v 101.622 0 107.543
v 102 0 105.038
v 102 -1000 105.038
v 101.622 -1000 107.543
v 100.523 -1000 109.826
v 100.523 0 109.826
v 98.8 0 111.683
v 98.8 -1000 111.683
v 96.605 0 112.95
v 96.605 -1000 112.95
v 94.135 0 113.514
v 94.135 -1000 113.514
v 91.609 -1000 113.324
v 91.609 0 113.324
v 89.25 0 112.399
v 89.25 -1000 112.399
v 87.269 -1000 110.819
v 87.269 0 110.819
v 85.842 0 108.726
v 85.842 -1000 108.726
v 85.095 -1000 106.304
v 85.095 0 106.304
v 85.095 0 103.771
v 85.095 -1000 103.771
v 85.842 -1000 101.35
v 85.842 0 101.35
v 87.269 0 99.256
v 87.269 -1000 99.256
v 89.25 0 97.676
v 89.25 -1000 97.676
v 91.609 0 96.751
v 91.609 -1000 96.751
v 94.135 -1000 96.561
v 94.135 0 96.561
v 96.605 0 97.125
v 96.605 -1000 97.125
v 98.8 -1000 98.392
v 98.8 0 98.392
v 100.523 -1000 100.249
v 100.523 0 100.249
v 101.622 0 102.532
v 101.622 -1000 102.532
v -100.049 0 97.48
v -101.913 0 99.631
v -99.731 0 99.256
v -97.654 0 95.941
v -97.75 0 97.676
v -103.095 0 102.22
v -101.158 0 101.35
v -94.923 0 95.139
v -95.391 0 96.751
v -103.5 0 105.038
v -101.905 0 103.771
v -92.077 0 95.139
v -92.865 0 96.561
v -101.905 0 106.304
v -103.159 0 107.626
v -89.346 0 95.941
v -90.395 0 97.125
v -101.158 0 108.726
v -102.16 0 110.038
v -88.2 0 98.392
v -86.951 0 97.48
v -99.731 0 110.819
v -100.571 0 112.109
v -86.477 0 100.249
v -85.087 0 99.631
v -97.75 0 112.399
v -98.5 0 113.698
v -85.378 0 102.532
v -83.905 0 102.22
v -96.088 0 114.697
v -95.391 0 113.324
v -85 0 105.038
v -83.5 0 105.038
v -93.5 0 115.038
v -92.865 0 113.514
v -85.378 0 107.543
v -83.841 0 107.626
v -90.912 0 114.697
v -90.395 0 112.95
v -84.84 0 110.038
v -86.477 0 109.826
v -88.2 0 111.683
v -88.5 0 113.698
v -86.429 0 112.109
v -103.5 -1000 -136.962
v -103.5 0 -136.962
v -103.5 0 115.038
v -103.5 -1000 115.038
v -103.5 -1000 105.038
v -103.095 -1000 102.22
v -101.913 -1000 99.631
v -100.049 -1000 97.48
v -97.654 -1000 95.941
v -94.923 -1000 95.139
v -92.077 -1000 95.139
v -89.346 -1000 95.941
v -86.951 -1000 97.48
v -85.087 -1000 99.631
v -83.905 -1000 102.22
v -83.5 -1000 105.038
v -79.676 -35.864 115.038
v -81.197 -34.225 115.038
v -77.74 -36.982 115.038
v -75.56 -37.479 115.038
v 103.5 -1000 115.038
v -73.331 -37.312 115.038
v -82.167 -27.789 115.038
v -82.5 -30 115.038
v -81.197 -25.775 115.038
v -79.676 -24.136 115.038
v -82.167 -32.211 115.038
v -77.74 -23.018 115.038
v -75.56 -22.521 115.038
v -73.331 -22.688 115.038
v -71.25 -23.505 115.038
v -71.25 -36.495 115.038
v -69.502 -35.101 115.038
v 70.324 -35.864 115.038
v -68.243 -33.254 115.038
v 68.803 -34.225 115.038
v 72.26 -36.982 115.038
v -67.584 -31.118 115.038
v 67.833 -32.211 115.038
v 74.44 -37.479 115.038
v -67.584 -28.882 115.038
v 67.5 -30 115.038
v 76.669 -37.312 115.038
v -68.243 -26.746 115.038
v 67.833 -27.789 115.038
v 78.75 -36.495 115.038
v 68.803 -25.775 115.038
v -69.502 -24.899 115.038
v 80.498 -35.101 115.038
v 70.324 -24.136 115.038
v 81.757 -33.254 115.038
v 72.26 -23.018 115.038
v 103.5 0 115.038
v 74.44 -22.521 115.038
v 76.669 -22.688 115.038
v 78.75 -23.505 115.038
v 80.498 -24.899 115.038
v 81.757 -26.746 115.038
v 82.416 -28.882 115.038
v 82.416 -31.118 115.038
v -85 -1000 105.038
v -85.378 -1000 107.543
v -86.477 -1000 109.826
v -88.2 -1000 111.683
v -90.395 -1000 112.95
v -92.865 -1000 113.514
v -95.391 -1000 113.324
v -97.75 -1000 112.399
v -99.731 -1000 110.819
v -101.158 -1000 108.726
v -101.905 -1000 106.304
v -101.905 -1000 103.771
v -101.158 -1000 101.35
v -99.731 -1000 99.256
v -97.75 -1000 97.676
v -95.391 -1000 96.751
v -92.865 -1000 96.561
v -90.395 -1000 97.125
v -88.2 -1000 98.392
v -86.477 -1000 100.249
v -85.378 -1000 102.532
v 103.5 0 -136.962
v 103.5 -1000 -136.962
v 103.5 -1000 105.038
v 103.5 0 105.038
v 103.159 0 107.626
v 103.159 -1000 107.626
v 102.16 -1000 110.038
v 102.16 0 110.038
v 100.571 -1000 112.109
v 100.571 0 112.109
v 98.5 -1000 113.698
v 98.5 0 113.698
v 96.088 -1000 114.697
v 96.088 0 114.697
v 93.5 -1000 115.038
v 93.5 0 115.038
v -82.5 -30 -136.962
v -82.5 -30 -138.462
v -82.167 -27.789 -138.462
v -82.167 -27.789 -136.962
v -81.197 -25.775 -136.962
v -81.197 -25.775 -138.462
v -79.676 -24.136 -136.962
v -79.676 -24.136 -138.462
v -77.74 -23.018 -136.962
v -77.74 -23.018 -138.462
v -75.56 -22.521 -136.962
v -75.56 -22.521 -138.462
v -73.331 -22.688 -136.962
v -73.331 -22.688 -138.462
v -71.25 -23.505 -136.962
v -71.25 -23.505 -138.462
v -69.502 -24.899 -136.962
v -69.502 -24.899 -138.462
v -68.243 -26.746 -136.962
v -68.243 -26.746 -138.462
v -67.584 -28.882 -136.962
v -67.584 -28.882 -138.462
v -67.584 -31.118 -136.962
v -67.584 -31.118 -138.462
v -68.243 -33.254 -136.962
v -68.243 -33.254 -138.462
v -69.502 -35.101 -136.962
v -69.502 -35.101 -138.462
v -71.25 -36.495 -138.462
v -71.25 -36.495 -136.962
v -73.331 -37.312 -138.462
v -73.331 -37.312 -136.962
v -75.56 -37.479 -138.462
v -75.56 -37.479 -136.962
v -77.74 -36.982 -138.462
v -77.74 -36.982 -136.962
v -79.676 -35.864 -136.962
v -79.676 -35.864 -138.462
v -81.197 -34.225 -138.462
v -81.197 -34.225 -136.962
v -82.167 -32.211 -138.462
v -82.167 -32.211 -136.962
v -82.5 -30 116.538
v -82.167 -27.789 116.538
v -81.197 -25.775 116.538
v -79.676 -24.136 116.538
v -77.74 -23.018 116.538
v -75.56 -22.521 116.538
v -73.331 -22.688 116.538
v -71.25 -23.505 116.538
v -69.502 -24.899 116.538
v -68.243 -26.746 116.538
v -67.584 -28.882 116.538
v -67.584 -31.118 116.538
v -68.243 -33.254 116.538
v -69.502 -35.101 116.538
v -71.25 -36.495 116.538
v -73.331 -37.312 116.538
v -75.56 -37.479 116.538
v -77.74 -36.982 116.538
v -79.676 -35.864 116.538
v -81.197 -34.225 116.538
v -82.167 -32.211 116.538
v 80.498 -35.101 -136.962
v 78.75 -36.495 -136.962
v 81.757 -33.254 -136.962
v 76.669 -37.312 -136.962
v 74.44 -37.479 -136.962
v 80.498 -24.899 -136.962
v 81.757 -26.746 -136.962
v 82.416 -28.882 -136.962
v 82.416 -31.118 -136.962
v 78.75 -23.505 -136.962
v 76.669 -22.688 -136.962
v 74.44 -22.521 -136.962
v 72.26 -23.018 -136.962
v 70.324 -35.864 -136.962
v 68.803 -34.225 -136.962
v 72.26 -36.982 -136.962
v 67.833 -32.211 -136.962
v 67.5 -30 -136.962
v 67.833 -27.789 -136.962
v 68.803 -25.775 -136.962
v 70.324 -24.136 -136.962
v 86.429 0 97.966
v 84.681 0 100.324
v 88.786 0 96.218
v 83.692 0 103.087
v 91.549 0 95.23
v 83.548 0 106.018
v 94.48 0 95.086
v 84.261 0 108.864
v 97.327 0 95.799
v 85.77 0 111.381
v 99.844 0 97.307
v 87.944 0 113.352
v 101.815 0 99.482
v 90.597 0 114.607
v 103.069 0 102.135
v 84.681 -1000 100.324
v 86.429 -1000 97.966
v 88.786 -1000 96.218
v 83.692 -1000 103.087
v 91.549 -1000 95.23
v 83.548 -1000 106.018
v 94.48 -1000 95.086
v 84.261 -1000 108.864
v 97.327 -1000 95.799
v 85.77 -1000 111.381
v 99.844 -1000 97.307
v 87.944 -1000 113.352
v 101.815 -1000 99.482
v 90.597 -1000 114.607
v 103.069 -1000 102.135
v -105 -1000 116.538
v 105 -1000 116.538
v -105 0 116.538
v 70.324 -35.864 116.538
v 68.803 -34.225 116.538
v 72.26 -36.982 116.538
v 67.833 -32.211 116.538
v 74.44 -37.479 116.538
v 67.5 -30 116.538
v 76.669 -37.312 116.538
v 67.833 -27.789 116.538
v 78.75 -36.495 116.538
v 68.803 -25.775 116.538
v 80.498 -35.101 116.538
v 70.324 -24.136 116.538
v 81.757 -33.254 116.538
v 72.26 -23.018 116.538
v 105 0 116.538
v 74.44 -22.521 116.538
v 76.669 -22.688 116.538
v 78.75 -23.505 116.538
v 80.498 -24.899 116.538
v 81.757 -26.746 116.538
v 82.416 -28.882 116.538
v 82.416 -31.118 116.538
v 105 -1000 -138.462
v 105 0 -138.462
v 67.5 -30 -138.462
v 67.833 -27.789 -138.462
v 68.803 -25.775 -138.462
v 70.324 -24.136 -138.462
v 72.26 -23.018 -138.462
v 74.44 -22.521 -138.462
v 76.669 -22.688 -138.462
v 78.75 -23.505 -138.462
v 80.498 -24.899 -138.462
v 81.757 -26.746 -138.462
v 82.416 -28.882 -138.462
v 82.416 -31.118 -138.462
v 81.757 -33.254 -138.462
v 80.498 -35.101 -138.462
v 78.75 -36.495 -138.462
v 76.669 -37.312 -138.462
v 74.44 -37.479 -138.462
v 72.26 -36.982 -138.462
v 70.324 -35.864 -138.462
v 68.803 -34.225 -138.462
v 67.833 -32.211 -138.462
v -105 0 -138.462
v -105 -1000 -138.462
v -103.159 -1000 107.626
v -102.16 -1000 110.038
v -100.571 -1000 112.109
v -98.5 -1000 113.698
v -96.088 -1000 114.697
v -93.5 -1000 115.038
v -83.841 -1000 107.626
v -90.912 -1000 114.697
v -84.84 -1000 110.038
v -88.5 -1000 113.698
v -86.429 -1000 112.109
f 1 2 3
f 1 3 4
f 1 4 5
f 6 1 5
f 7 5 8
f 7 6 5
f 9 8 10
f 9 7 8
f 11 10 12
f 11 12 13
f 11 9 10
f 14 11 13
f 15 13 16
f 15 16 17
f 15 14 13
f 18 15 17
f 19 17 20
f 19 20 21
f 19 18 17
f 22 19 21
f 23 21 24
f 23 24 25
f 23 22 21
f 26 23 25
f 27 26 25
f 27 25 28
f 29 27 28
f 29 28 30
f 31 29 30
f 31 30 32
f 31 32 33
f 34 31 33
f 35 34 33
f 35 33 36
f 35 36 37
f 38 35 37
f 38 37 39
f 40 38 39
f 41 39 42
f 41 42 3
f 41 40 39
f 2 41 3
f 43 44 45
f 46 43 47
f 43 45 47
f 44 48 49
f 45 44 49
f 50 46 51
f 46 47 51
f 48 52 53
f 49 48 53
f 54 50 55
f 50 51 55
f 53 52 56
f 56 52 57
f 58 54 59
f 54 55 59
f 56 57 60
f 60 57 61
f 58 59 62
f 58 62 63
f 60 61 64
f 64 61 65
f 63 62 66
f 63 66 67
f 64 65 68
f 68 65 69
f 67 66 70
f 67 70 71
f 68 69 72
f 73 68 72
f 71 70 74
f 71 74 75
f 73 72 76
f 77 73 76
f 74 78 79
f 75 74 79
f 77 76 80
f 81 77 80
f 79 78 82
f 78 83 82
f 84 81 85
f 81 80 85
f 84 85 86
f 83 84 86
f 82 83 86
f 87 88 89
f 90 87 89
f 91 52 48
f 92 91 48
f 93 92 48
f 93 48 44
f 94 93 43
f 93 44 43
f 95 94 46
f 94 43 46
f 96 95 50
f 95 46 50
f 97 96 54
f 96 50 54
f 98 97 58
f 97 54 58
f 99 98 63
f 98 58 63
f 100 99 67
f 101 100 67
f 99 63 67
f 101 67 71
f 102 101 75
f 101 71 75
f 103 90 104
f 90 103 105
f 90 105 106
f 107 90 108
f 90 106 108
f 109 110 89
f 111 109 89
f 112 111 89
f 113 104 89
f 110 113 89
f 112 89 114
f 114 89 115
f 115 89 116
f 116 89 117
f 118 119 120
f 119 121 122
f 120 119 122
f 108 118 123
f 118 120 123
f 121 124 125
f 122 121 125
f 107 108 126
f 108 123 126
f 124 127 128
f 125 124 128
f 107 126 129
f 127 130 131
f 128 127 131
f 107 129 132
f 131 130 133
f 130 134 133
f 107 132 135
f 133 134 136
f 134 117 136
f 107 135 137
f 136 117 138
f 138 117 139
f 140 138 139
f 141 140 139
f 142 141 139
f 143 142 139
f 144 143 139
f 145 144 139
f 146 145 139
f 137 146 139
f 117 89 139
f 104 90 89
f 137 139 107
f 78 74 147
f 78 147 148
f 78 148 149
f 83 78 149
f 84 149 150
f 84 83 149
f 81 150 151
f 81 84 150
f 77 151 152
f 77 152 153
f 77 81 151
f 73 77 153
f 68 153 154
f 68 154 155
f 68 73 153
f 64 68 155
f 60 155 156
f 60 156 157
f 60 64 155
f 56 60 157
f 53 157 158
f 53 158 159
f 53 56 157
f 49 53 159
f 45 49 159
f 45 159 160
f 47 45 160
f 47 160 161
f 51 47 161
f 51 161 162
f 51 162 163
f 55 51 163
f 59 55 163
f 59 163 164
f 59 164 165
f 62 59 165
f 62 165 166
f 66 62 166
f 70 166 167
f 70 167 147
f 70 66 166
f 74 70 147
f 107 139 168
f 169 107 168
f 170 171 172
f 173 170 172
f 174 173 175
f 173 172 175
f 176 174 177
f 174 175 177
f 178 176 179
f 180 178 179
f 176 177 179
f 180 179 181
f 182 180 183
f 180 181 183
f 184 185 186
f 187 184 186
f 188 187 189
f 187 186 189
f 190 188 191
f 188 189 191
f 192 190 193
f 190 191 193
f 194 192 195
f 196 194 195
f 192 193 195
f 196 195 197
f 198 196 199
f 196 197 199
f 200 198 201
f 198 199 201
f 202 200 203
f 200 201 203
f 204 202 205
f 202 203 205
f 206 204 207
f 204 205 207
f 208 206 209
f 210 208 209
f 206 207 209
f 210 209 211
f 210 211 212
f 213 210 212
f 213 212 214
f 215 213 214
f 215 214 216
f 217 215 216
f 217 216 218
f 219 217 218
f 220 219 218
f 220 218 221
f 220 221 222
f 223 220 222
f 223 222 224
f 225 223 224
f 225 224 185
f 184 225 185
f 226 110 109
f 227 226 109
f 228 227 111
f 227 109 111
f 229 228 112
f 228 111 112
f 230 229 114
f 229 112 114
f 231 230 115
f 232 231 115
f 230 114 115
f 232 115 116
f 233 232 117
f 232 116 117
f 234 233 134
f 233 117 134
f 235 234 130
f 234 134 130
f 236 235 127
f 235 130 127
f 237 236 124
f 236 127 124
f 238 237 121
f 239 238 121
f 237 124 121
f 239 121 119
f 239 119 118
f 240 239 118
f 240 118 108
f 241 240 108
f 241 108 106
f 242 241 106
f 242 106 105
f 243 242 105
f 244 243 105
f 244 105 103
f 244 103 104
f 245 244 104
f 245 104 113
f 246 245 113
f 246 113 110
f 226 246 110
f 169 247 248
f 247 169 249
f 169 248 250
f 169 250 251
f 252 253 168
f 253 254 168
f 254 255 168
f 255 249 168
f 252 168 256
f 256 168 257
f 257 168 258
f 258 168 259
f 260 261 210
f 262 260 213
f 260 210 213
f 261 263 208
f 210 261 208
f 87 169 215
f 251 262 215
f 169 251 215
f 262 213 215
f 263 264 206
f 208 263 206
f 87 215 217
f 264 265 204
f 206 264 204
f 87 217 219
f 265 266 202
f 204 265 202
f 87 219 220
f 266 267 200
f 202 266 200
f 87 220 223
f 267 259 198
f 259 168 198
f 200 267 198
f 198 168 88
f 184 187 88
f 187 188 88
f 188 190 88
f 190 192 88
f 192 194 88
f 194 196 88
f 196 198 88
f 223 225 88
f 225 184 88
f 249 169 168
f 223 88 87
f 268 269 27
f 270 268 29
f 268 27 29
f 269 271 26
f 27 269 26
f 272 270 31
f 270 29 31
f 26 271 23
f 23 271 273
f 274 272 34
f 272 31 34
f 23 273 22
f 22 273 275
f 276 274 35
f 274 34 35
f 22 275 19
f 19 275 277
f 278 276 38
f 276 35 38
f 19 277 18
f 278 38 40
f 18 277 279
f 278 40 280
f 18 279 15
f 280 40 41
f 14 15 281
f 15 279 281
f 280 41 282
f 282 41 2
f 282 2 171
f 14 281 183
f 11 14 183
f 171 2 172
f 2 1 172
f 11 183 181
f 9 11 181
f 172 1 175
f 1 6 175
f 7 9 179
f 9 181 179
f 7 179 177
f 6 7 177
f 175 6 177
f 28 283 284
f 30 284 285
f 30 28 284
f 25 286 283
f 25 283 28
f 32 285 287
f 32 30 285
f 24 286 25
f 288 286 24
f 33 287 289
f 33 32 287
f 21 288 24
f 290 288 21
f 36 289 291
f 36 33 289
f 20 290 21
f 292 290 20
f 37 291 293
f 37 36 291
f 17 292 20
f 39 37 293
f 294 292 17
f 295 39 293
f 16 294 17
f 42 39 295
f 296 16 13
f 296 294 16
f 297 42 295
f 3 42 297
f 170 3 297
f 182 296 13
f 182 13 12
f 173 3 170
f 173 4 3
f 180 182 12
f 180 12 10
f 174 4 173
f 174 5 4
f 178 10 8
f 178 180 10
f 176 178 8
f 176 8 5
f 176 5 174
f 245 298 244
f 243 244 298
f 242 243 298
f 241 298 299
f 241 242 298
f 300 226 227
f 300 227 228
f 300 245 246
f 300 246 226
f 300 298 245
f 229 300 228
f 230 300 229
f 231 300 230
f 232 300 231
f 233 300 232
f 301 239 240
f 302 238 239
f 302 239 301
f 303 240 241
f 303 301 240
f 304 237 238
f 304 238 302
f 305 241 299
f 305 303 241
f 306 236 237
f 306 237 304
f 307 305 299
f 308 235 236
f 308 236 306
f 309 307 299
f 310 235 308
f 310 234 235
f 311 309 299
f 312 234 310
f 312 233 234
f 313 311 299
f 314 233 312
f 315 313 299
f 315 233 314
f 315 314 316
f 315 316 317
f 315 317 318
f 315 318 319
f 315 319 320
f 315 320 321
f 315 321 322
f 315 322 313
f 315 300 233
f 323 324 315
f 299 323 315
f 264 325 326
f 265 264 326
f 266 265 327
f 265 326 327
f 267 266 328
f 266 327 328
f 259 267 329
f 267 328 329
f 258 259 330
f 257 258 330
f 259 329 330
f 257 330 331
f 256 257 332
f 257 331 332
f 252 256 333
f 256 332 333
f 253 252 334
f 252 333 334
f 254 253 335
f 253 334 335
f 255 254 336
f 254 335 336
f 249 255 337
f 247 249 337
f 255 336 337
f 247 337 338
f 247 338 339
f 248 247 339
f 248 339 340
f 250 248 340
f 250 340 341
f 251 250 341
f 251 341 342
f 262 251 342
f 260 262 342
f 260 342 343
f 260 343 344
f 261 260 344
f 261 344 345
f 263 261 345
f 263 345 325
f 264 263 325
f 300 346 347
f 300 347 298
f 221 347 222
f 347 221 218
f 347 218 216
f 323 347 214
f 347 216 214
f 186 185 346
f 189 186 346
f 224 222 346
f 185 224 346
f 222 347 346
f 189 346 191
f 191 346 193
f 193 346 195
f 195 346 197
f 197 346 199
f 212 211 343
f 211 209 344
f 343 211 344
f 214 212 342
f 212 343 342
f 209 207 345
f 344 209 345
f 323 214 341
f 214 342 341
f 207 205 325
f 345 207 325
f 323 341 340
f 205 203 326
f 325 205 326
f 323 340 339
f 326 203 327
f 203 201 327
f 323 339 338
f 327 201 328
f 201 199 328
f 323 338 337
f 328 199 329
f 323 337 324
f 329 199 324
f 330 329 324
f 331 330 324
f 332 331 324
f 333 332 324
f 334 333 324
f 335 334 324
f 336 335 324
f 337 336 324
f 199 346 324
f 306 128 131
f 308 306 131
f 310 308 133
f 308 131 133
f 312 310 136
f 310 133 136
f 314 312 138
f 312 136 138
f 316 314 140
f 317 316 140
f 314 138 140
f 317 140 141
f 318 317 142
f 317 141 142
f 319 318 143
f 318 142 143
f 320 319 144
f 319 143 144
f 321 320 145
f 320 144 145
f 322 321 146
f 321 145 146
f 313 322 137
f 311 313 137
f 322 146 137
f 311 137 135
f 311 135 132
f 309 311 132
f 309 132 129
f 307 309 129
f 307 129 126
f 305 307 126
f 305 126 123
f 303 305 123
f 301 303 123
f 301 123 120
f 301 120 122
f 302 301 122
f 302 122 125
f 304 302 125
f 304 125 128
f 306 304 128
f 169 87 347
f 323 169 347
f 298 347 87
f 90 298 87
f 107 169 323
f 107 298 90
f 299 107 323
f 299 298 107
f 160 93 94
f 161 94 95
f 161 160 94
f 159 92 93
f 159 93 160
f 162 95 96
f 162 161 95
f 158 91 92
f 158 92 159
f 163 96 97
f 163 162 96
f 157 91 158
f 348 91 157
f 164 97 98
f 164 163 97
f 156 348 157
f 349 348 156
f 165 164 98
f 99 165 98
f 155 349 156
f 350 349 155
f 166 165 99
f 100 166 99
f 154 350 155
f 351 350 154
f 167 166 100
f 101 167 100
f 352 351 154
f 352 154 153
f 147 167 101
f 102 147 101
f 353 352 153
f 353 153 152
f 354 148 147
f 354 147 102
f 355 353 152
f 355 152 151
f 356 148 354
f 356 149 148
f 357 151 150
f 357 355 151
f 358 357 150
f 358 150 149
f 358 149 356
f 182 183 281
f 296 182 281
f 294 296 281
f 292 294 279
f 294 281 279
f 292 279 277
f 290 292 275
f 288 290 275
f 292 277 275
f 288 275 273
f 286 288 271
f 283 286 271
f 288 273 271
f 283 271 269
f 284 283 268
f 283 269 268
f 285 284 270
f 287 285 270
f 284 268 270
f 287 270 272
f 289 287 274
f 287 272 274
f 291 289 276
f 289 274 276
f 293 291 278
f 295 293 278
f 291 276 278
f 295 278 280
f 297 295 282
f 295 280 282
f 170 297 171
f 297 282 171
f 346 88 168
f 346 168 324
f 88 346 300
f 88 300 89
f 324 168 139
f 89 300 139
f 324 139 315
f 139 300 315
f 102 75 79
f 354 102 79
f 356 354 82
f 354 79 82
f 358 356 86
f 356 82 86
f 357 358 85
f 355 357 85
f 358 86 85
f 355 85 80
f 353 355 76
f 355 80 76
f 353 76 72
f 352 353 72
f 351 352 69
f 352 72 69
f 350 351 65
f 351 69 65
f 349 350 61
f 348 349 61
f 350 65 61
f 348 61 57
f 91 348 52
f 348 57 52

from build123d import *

# Parameters (mm, degrees)
F0_R     = 8.5
F1_DEPTH = 1000
F0_W     = 210
F0_H     = 255
F3_D     = 15


with BuildPart() as f1:
    # F0 (on Front) → F1 (new body)
    with BuildSketch(Plane.XZ):
        with BuildLine():
            ThreePointArc((-83.5, 105.0375561347), (-86.4289321881, 112.1086239466), (-93.5, 115.0375561347))
            ThreePointArc((-93.5, 115.0375561347), (-100.5710678119, 112.1086239466), (-103.5, 105.0375561347))
            ThreePointArc((-103.5, 105.0375561347), (-93.5, 95.0375561347), (-83.5, 105.0375561347))
        make_face()
        with Locations((-93.5, 105.0375561347)):
            Circle(F0_R, mode=Mode.SUBTRACT)
    extrude(amount=F1_DEPTH)


with BuildPart() as f1b:
    # F0 (on Front) → F1, piece 2 (new body)
    with BuildSketch(Plane.XZ):
        with Locations((0, -10.9624438653)):
            Rectangle(F0_W, F0_H)
        Polygon((-103.5, 105.0375561347), (-103.5, 115.0375561347), (-93.5, 115.0375561347), (93.5, 115.0375561347), (103.5, 115.0375561347), (103.5, 105.0375561347), (103.5, -136.9624438653), (-103.5, -136.9624438653), align=None, mode=Mode.SUBTRACT)
    extrude(amount=F1_DEPTH)

    # F3 (through all)
    with Locations(Plane.XY.offset(116.5375561347)):
        with Locations((75, -30), (-75, -30)):
            Hole(F3_D / 2)


with BuildPart() as f1c:
    # F0 (on Front) → F1, piece 3 (new body)
    with BuildSketch(Plane.XZ):
        with BuildLine():
            ThreePointArc((103.5, 105.0375561347), (100.5710678119, 112.1086239466), (93.5, 115.0375561347))
            ThreePointArc((93.5, 115.0375561347), (86.4289321881, 97.9664883229), (103.5, 105.0375561347))
        make_face()
        with Locations((93.5, 105.0375561347)):
            Circle(F0_R, mode=Mode.SUBTRACT)
    extrude(amount=F1_DEPTH)


solid = Compound([f1.part, f1b.part, f1c.part])
